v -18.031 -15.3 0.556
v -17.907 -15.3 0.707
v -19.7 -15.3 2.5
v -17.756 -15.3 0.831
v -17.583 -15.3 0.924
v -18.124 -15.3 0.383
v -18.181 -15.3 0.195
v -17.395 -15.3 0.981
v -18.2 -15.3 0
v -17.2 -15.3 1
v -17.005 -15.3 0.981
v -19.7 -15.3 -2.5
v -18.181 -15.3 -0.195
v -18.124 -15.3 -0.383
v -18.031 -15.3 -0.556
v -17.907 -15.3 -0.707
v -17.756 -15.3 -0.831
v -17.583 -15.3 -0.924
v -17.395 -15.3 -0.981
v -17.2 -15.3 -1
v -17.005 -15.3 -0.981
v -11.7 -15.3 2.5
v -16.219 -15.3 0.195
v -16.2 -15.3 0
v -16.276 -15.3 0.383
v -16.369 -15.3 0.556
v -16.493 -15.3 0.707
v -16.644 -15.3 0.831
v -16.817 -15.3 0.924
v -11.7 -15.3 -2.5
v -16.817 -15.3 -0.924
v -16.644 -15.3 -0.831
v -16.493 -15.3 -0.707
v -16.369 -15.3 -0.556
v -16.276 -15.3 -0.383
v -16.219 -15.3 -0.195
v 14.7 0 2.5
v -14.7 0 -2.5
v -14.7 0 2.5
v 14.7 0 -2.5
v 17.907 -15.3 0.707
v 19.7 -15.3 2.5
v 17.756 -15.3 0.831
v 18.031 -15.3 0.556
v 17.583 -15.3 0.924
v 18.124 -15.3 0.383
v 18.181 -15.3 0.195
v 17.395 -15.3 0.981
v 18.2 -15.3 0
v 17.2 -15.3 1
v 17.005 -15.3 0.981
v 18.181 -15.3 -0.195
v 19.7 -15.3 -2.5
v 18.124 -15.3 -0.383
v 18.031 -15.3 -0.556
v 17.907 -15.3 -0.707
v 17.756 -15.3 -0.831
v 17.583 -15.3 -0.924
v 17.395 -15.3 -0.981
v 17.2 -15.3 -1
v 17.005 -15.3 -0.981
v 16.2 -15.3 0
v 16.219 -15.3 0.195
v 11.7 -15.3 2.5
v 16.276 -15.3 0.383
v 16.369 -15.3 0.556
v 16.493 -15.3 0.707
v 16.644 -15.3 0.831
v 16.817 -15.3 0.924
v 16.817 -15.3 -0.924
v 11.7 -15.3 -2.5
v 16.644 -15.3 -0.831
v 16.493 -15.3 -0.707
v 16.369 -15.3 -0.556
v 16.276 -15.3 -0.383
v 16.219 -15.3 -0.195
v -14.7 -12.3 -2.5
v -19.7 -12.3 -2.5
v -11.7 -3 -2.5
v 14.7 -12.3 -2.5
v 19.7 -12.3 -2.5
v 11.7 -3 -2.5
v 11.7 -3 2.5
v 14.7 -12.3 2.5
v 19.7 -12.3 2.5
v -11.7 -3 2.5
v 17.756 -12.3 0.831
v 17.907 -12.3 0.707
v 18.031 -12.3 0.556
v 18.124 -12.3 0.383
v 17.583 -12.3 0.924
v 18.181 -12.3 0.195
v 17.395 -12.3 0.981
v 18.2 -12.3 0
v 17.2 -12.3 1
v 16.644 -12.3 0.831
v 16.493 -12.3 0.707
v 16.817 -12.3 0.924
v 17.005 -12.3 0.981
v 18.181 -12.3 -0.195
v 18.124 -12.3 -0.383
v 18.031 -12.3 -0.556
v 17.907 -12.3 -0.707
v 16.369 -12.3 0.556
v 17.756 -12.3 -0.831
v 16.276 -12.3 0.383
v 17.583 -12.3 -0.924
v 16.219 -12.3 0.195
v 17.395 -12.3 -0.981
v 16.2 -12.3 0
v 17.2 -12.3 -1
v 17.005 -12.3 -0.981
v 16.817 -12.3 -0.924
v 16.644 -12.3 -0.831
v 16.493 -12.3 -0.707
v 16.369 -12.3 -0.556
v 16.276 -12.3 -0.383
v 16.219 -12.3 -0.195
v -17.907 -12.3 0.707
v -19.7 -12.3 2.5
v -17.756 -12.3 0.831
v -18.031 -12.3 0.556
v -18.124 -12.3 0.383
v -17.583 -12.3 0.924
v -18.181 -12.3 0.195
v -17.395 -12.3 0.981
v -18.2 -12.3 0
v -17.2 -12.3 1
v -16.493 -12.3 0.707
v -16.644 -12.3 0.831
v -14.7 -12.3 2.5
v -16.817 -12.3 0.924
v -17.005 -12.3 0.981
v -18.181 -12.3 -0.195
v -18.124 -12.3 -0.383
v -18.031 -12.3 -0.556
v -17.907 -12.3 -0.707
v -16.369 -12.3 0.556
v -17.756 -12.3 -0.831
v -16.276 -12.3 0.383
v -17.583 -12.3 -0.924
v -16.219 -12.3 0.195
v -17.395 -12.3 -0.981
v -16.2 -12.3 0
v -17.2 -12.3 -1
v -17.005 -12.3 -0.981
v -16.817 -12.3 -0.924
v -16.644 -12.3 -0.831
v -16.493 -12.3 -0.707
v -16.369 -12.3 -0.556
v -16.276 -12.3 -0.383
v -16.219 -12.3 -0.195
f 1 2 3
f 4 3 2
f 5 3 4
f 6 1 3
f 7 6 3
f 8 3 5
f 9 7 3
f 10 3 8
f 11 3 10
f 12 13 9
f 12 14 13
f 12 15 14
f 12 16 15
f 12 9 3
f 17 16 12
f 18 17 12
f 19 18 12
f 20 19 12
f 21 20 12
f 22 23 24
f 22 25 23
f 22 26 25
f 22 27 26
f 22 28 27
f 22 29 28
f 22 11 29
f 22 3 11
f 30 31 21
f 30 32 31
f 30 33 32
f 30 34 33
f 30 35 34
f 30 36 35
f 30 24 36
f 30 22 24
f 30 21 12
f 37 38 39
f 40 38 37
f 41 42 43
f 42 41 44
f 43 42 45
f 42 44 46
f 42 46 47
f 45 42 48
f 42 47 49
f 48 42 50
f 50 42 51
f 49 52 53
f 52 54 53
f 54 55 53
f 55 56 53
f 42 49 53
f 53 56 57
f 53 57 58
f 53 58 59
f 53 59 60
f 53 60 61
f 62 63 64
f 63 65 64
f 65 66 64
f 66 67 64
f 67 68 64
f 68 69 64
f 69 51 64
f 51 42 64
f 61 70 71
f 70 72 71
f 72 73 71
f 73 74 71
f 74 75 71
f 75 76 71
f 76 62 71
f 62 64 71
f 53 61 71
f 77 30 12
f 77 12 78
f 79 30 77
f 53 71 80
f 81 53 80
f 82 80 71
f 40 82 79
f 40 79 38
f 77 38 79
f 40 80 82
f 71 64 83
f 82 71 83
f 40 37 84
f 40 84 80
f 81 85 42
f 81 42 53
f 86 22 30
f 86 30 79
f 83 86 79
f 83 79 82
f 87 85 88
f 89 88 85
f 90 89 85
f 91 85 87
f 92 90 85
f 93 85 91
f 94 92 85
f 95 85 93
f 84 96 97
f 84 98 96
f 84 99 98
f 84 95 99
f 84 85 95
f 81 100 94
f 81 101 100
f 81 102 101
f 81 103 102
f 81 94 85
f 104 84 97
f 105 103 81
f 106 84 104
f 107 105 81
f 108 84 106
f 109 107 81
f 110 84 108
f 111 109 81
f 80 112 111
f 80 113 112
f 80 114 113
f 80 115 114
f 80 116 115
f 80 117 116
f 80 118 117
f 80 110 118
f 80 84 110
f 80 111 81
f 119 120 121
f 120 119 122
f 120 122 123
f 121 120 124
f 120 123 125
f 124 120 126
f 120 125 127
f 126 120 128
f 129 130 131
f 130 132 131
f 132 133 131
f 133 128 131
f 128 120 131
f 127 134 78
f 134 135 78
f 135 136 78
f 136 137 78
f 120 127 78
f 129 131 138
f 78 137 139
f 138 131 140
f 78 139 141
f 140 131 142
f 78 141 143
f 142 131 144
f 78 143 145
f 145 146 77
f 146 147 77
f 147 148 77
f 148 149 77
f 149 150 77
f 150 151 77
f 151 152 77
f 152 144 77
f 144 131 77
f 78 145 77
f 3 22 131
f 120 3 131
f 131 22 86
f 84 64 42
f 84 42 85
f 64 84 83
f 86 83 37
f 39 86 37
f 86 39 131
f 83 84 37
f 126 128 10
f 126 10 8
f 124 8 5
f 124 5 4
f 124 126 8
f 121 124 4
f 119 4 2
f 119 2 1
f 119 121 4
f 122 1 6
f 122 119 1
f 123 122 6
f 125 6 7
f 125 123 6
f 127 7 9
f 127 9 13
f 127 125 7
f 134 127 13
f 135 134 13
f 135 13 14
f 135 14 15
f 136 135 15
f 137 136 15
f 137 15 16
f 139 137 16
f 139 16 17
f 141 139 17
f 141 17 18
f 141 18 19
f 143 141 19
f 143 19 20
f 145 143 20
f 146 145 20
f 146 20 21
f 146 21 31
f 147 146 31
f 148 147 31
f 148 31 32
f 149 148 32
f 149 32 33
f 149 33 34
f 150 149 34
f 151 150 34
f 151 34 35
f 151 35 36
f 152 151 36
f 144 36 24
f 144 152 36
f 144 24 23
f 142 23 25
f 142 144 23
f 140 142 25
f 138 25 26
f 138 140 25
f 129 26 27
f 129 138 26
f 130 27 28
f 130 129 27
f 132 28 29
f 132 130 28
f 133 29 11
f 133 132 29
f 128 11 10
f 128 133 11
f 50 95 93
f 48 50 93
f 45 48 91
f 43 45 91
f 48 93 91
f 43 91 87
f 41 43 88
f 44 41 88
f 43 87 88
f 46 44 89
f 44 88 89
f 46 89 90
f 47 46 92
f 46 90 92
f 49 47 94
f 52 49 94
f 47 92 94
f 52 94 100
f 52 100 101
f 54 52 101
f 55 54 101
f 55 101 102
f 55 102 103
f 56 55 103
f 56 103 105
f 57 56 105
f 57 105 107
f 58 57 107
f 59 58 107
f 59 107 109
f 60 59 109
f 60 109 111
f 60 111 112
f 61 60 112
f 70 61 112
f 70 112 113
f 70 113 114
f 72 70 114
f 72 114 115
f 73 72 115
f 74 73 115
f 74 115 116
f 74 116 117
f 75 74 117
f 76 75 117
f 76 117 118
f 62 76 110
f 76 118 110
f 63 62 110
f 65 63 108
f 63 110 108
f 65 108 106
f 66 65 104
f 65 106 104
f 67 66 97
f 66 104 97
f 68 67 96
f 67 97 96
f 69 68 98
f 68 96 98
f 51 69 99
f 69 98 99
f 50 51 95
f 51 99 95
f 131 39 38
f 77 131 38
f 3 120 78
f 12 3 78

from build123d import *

# Parameters (mm, degrees)
SKETCH1_W           = 29.4
SKETCH1_H           = 5
BOSS_EXTRUDE1_DEPTH = 15.3
CUT_EXTRUDE2_REACH  = 23.799
SKETCH4_W           = 23.4
SKETCH4_H           = 12.3
SKETCH5_W           = 5
SKETCH5_H           = 3
BOSS_EXTRUDE3_DEPTH = 5
CUT_EXTRUDE3_REACH  = 25.359
SKETCH6_R           = 1


with BuildPart() as part:
    # Sketch1 → Boss-Extrude1 (new body)
    with BuildSketch(Plane(origin=(0, 0, 0), x_dir=(1, 0, 0), z_dir=(0, 1, 0))):
        Rectangle(SKETCH1_W, SKETCH1_H)
    extrude(amount=-BOSS_EXTRUDE1_DEPTH)

    # Sketch4 → Cut-Extrude2 (cut, up to next)
    with BuildSketch(Plane.XY.offset(2.5), mode=Mode.PRIVATE) as cut_extrude2_sk1:
        with Locations((0, -9.15)):
            Rectangle(SKETCH4_W, SKETCH4_H)
    cut_extrude2_tool1 = extrude(cut_extrude2_sk1.sketch, amount=-CUT_EXTRUDE2_REACH, mode=Mode.PRIVATE) & part.part
    add(cut_extrude2_tool1.solids().sort_by_distance((0, -9.15, 2.5))[0], mode=Mode.SUBTRACT)

    # Sketch5 → Boss-Extrude3 (add)
    with BuildSketch(Plane(origin=(14.7, 0, 0), x_dir=(0, 0, -1), z_dir=(1, 0, 0))):
        with Locations((0, -13.8)):
            Rectangle(SKETCH5_W, SKETCH5_H)
    boss_extrude3 = extrude(amount=BOSS_EXTRUDE3_DEPTH)

    # Sketch6 → Cut-Extrude3 (cut, up to next)
    with BuildSketch(Plane(origin=(0, -12.3, 0), x_dir=(1, 0, 0), z_dir=(0, 1, 0)), mode=Mode.PRIVATE) as cut_extrude3_sk1:
        with Locations(Location((17.2, 0, 0), (0, 0, 270))):
            Circle(SKETCH6_R)
    cut_extrude3_tool1 = extrude(cut_extrude3_sk1.sketch, amount=-CUT_EXTRUDE3_REACH, mode=Mode.PRIVATE) & part.part
    cut_extrude3 = cut_extrude3_tool1.solids().sort_by_distance((17.2, -12.3, 0))[0]
    add(cut_extrude3, mode=Mode.SUBTRACT)

    # Mirror2: Boss-Extrude3, Cut-Extrude3 across plane
    add(boss_extrude3.mirror(Plane(origin=(0, 0, 0), x_dir=(0, 0, 1), z_dir=(1, 0, 0))))
    add(cut_extrude3.mirror(Plane(origin=(0, 0, 0), x_dir=(0, 0, 1), z_dir=(1, 0, 0))), mode=Mode.SUBTRACT)


solid = part.part
